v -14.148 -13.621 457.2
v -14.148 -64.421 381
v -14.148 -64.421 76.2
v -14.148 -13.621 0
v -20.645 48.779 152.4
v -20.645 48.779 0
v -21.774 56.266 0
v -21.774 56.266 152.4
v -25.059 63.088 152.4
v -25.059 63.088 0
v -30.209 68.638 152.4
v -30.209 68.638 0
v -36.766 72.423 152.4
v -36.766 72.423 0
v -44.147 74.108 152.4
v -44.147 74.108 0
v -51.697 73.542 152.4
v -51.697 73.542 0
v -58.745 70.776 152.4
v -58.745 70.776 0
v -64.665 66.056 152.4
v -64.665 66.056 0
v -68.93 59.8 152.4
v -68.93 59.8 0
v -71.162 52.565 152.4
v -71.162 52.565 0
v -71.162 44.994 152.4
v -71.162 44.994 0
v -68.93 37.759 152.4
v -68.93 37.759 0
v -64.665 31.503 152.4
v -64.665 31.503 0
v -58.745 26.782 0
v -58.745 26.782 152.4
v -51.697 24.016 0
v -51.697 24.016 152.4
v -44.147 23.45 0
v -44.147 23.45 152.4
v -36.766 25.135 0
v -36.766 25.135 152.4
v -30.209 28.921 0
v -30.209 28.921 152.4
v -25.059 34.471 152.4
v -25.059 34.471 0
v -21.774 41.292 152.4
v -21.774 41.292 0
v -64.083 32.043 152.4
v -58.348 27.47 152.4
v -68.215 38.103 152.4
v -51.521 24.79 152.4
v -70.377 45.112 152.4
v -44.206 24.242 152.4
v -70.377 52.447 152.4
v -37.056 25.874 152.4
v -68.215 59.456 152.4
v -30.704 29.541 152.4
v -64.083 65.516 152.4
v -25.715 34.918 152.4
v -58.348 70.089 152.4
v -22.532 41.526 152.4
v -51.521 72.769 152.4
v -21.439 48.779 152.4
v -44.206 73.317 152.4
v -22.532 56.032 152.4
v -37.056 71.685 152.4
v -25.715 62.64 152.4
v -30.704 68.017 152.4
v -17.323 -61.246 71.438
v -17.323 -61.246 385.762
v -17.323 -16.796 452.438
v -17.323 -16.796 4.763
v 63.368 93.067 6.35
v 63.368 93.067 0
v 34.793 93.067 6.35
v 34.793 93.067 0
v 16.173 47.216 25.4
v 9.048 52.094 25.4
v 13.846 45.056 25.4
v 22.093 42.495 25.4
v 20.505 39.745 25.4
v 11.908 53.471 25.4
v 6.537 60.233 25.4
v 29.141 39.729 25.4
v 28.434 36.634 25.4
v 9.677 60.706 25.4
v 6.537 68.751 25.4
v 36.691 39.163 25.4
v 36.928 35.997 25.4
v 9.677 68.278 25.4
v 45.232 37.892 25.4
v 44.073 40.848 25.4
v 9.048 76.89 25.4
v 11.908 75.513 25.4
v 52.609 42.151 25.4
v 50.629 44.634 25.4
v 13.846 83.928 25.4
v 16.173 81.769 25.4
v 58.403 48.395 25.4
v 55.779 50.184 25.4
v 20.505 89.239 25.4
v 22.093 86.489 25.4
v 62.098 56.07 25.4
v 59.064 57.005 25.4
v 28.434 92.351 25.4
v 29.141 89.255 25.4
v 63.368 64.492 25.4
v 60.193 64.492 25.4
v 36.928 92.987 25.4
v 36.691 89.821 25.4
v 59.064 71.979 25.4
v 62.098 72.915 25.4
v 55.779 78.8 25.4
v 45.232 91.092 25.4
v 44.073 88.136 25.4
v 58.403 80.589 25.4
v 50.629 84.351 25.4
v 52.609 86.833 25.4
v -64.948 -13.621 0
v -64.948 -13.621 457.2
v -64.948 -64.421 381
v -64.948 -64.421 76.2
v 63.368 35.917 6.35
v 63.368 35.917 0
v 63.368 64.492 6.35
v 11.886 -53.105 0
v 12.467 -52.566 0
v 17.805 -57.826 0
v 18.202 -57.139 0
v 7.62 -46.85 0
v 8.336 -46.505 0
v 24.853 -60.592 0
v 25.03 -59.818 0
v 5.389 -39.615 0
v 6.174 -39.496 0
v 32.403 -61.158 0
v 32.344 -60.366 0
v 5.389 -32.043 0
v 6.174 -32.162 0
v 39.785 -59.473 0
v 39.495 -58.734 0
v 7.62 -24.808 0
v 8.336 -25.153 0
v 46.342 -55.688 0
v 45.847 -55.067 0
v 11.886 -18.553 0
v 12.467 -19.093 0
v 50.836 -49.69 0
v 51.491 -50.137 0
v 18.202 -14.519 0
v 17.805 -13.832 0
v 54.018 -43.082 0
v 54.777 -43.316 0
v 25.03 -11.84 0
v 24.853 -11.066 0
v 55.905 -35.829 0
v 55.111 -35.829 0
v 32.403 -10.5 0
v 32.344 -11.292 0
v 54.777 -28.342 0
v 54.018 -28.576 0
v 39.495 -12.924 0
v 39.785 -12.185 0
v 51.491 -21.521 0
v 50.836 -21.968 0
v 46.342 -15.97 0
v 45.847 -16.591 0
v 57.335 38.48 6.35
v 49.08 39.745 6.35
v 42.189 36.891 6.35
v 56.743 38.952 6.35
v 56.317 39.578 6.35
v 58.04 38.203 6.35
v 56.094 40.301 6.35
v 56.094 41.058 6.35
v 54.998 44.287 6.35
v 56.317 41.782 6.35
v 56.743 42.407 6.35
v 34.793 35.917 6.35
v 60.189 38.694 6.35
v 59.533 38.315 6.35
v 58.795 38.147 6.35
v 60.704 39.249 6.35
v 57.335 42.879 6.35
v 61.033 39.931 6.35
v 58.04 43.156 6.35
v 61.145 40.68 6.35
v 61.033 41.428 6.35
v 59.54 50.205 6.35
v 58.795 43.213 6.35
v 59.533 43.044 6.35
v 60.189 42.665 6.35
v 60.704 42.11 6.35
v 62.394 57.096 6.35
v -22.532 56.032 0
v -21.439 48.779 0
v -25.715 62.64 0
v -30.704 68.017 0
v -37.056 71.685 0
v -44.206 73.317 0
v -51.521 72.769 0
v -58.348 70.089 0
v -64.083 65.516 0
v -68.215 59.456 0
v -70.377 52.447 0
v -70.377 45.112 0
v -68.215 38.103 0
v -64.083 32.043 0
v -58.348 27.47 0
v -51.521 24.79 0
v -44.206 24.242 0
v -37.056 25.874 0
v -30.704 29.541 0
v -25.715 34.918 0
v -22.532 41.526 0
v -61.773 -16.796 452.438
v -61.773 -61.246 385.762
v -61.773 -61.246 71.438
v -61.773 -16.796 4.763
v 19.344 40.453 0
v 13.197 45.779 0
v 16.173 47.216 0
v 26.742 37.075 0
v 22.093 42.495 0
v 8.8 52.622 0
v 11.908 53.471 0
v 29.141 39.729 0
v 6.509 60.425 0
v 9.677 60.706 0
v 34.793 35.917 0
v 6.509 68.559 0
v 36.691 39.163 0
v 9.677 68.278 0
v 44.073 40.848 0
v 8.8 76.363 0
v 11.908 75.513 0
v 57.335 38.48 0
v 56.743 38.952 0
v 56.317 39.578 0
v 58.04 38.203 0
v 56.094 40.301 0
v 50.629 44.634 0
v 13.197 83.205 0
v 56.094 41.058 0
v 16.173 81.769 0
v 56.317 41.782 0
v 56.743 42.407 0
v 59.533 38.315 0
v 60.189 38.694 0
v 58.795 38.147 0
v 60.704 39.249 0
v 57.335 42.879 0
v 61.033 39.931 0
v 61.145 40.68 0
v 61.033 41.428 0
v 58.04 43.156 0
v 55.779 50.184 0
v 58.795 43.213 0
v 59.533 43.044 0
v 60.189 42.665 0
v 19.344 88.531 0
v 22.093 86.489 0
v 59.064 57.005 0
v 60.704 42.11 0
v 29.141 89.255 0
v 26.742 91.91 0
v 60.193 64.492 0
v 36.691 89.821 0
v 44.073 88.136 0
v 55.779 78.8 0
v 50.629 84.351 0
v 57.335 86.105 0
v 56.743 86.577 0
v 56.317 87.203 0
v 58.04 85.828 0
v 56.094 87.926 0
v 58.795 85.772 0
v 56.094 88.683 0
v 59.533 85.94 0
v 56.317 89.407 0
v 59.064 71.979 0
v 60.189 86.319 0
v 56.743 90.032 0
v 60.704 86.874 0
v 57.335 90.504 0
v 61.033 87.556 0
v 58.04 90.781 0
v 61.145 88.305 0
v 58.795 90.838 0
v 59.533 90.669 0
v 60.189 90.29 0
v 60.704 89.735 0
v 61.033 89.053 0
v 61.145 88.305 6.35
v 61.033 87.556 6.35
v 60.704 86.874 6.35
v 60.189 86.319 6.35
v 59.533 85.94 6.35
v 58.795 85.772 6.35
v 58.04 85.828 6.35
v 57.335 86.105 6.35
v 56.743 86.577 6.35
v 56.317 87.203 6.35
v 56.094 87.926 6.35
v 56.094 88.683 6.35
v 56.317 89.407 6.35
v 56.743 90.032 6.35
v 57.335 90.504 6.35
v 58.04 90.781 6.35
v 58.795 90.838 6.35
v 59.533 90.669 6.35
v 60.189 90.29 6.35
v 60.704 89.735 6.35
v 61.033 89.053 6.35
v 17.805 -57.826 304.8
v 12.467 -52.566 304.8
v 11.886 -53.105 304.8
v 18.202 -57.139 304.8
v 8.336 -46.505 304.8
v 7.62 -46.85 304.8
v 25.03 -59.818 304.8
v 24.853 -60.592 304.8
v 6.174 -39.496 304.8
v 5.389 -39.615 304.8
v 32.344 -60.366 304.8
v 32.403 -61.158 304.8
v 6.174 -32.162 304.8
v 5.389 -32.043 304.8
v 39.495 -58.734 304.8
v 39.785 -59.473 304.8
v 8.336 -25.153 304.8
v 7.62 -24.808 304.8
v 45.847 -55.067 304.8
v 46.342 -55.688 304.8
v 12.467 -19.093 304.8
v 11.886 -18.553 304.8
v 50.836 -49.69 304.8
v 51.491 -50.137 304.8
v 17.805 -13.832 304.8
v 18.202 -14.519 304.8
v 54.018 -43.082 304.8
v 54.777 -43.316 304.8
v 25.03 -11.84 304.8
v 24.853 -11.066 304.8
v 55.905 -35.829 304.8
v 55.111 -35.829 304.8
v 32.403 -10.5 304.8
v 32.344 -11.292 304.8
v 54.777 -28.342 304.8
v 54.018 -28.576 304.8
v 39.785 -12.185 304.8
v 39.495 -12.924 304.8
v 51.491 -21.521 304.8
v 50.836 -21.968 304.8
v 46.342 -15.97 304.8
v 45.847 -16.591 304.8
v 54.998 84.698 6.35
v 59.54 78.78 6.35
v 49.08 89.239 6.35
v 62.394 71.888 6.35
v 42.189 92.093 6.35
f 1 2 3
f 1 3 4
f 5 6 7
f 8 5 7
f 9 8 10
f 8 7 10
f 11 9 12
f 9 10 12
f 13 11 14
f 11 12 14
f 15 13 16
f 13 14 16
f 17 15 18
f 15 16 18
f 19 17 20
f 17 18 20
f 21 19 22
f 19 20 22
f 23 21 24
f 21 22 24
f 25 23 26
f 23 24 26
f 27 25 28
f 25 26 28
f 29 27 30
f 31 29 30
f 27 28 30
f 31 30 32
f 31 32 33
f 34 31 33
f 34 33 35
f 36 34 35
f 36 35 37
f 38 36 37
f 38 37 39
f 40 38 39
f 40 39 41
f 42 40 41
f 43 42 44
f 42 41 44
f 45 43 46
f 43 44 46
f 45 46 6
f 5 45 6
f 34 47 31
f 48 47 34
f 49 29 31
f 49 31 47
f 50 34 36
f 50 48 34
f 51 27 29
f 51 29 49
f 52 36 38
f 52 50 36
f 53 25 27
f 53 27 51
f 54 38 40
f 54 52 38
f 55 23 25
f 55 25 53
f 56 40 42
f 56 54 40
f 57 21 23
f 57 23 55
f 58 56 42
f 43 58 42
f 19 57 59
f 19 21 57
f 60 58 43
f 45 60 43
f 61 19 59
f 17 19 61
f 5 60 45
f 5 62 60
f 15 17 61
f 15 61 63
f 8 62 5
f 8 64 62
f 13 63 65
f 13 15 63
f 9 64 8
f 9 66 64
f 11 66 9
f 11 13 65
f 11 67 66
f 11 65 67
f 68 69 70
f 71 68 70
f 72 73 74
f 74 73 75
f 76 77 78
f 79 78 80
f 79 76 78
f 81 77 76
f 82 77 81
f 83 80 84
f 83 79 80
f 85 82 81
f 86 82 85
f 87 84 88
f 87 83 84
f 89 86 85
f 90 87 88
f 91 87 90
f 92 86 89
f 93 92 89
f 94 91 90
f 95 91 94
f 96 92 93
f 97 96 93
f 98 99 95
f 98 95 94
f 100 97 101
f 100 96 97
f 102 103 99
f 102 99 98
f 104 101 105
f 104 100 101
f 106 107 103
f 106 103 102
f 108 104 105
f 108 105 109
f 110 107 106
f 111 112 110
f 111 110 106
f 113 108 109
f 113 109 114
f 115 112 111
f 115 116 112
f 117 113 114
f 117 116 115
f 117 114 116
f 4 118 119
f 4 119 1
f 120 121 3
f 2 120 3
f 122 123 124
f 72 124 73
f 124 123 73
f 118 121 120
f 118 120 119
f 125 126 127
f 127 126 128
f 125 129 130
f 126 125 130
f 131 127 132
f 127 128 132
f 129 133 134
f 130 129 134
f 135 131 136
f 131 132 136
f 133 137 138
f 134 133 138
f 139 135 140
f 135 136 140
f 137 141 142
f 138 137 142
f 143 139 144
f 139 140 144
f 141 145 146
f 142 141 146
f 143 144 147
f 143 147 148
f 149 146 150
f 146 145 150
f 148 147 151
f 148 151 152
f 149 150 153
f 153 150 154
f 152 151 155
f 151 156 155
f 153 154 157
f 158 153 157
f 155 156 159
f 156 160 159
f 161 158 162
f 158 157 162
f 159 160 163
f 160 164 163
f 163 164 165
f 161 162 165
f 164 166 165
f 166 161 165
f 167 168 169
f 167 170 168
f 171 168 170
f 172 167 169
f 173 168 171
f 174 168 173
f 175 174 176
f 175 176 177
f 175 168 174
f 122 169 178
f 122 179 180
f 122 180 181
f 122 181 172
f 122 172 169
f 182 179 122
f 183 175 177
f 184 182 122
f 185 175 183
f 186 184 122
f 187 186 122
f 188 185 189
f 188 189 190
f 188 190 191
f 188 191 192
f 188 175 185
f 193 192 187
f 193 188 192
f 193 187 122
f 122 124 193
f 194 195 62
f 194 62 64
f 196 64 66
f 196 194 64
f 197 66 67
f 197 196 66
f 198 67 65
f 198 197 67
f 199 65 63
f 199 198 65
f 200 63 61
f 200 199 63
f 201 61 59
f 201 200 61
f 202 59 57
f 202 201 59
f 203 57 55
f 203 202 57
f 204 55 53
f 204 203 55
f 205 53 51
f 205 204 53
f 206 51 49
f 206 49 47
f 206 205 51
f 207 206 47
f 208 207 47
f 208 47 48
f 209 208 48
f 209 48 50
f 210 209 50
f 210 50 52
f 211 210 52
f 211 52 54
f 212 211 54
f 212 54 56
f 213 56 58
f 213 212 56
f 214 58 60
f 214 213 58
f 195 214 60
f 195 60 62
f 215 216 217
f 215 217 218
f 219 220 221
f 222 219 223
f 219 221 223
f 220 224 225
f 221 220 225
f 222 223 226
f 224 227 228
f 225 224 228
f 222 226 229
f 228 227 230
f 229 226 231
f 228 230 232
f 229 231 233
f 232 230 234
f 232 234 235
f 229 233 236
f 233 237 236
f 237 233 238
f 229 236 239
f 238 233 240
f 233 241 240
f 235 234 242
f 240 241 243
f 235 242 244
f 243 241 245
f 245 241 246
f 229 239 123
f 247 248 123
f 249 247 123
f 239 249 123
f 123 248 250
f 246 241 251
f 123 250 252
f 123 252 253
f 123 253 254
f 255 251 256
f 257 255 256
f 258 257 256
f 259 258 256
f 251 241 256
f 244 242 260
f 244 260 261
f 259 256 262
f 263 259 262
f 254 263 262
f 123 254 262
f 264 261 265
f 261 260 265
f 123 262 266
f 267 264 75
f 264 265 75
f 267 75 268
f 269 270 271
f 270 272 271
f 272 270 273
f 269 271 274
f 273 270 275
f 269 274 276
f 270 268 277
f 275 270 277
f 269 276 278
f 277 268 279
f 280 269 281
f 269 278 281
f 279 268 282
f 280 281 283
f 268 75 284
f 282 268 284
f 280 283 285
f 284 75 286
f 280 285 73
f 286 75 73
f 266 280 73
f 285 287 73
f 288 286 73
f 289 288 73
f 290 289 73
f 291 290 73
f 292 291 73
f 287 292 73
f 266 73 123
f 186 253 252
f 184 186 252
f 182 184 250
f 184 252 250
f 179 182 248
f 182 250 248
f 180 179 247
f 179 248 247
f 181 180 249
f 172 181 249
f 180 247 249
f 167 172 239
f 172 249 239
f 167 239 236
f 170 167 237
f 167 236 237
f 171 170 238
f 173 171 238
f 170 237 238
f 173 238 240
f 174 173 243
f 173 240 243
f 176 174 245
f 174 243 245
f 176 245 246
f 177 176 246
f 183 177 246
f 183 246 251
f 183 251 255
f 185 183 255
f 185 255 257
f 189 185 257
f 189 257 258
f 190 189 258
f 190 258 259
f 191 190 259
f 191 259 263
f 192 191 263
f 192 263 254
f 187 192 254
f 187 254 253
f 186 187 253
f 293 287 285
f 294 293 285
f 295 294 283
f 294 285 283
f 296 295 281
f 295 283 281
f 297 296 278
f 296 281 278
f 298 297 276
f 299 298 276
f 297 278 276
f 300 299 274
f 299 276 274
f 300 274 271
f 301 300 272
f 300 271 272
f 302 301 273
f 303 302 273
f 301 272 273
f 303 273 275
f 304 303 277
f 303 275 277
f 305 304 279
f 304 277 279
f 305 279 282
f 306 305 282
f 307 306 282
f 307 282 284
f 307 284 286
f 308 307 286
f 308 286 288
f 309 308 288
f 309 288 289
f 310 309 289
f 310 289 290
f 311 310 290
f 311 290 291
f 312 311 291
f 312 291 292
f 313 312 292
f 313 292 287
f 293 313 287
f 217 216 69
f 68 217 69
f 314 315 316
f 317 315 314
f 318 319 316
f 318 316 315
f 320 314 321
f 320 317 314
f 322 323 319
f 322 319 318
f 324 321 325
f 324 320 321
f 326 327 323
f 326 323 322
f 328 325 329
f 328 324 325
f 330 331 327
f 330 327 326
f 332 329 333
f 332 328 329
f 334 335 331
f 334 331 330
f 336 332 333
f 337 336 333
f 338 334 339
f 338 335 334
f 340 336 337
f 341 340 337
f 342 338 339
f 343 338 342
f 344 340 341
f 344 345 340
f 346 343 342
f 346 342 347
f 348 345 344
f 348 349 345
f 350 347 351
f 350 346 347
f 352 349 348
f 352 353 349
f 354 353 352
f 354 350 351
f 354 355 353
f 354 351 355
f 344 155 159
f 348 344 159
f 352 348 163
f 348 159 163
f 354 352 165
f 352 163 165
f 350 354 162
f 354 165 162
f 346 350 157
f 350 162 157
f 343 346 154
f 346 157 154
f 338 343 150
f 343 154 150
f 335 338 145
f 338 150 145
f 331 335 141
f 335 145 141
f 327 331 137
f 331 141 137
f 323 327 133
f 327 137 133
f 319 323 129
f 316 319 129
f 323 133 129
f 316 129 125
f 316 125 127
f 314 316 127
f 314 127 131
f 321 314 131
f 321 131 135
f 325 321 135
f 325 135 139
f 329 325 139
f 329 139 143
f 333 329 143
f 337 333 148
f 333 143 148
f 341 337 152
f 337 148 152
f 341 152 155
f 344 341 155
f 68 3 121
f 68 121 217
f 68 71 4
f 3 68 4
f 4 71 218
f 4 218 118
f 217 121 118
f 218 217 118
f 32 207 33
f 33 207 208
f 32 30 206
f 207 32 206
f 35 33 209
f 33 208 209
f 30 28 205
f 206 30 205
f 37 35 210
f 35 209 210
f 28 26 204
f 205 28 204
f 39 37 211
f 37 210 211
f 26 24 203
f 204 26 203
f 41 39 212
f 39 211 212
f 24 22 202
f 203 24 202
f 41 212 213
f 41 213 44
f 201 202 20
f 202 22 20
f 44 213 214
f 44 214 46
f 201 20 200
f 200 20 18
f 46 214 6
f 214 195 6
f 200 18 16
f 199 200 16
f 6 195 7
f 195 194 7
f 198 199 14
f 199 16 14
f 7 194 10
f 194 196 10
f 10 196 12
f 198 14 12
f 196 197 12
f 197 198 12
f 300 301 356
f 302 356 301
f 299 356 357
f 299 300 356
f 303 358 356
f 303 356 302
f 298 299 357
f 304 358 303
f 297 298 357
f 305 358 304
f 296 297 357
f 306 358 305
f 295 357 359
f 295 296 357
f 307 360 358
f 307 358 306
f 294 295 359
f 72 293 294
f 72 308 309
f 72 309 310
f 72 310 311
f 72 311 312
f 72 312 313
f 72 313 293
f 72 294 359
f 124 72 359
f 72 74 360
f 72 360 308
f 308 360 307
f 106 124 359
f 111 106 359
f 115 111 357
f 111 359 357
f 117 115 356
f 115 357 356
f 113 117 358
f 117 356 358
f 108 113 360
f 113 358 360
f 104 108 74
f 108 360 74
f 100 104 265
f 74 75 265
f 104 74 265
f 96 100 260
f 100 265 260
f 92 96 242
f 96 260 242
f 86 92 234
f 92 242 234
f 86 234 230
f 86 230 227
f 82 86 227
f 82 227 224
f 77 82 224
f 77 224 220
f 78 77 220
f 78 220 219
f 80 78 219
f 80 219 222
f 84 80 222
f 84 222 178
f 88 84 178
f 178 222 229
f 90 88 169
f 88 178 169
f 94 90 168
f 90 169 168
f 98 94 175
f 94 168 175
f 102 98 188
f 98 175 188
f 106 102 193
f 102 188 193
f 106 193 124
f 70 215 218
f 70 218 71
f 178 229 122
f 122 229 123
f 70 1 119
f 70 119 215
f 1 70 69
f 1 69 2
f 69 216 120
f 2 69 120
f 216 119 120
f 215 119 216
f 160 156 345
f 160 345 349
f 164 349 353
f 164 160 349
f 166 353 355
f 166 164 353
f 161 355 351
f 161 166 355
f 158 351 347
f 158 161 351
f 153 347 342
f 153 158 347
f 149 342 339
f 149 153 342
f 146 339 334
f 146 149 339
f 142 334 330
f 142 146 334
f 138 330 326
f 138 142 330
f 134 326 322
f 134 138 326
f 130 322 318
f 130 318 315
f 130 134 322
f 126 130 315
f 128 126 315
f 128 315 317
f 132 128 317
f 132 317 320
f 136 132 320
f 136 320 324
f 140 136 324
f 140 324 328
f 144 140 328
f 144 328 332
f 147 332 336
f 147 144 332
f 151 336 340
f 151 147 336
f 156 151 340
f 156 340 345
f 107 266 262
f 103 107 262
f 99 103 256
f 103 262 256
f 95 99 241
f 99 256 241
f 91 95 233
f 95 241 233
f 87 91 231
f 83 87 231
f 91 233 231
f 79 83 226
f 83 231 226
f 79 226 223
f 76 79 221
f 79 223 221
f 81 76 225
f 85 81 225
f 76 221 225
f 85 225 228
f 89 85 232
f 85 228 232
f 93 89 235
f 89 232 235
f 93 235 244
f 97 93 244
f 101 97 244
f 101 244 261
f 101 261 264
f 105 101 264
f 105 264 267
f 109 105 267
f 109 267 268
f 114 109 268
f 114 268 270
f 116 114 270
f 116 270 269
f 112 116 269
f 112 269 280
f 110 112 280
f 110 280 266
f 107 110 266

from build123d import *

# Parameters (mm, degrees)
F0_R       = 25.4
F0_R_2     = 24.60625
F1_DEPTH   = 152.4
F2_R       = 25.4
F2_R_2     = 24.60625
F3_DEPTH   = 304.8
F5_DEPTH   = 6.35
F7_DEPTH   = 19.05
F8_R       = 25.4
F8_R_2     = 2.54
F9_DEPTH   = 304.801
F10_R      = 26.9875
F11_DEPTH  = 6.35
F12_R      = 24.60625
F13_DEPTH  = 19.05
F14_R      = 2.159
F14_R_2    = 12.7
F13_FACE_R = 24.60625
F15_DEPTH  = 304.801
F16_R      = 2.159
F17_DEPTH  = 19.05
F18_R      = 12.7
F19_DEPTH  = 19.05
F20_R      = 25.4
F20_R_2    = 2.159
F20_R_3    = 12.7
F21_DEPTH  = 3.175
F23_W      = 50.8
F23_H      = 50.8
F23_W_2    = 44.45
F23_H_2    = 44.45
F24_DEPTH  = 457.2
F26_DEPTH  = 128.3173194947


with BuildPart() as f1:
    # F0 (on Top) → F1 (new body)
    with BuildSketch(Plane.XY):
        with Locations((-46.0453219712, 48.7792603672)):
            Circle(F0_R)
        with Locations((-46.0453219712, 48.7792603672)):
            Circle(F0_R_2, mode=Mode.SUBTRACT)
    extrude(amount=F1_DEPTH)


with BuildPart() as f3:
    # F2 (on Top) → F3 (new body)
    with BuildSketch(Plane.XY):
        with Locations((30.5050238967, -35.8290150762)):
            Circle(F2_R)
        with Locations((30.5050238967, -35.8290150762)):
            Circle(F2_R_2, mode=Mode.SUBTRACT)
    extrude(amount=F3_DEPTH)


with BuildPart() as f5:
    # F4 (on Top) → F5 (new body)
    with BuildSketch(Plane.XY):
        with BuildLine():
            Line((63.3678516858, 35.9171391623), (63.3678516858, 64.4921391623))
            ThreePointArc((63.3678516858, 64.4921391623), (54.9984279582, 44.2865628899), (34.7928516858, 35.9171391623))
            Line((34.7928516858, 35.9171391623), (63.3678516858, 35.9171391623))
        make_face()
        with BuildLine():
            ThreePointArc((34.7928516858, 35.9171391623), (54.9984279582, 44.2865628899), (63.3678516858, 64.4921391623))
            ThreePointArc((63.3678516858, 64.4921391623), (54.9984279582, 84.6977154347), (34.7928516858, 93.0671391623))
            Line((34.7928516858, 93.0671391623), (34.7928516858, 35.9171391623))
        make_face()
        with BuildLine():
            ThreePointArc((34.7928516858, 93.0671391623), (54.9984279582, 84.6977154347), (63.3678516858, 64.4921391623))
            Line((63.3678516858, 64.4921391623), (63.3678516858, 93.0671391623))
            Line((63.3678516858, 93.0671391623), (34.7928516858, 93.0671391623))
        make_face()
        with BuildLine():
            Line((34.7928516858, 35.9171391623), (34.7928516858, 93.0671391623))
            ThreePointArc((34.7928516858, 93.0671391623), (6.2178516858, 64.4921391623), (34.7928516858, 35.9171391623))
        make_face()
    extrude(amount=F5_DEPTH)

    # F6 (on face) → F7 (join)
    with BuildSketch(Plane.XY.offset(6.35)):
        with BuildLine():
            ThreePointArc((34.7928516858, 35.9171391623), (54.9984279582, 44.2865628899), (63.3678516858, 64.4921391623))
            ThreePointArc((63.3678516858, 64.4921391623), (54.9984279582, 84.6977154347), (34.7928516858, 93.0671391623))
            ThreePointArc((34.7928516858, 93.0671391623), (6.2178516858, 64.4921391623), (34.7928516858, 35.9171391623))
        make_face()
    extrude(amount=F7_DEPTH)

    # F8 (on face) → F9 (cut, through all)
    with BuildSketch(Plane(origin=(0, 0, 0), x_dir=(1, 0, 0), z_dir=(0, 0, -1))):
        with Locations((34.7928516858, -64.4921391623)):
            Circle(F8_R)
        with Locations((58.6053516858, -88.3046391623)):
            Circle(F8_R_2)
        with Locations((58.6053516858, -40.6796391623)):
            Circle(F8_R_2)
    extrude(amount=-F9_DEPTH, mode=Mode.SUBTRACT)


with BuildPart() as f11:
    # F10 (on Top) → F11 (new body)
    with BuildSketch(Plane.XY):
        with Locations((-46.9862222672, -21.7718593776)):
            Circle(F10_R)
    extrude(amount=F11_DEPTH)

    # F12 (on face) → F13 (join)
    with BuildSketch(Plane.XY.offset(6.35)):
        with Locations((-46.9862222672, -21.7718593776)):
            Circle(F12_R)
    extrude(amount=F13_DEPTH)

    # F14 (on face) + F13_face (on face) → F15 (cut, through all)
    with BuildSketch(Plane(origin=(0, 0, 0), x_dir=(1, 0, 0), z_dir=(0, 0, -1))):
        with Locations((-46.9862222672, 43.3618593776)):
            Circle(F14_R)
        with Locations((-25.3962222672, 21.7718593776)):
            Circle(F14_R)
        with Locations((-46.9862222672, 0.1818593776)):
            Circle(F14_R)
        with Locations((-68.5762222672, 21.7718593776)):
            Circle(F14_R)
        with Locations((-46.9862222672, 21.7718593776)):
            Circle(F14_R_2)
    with BuildSketch(Plane(origin=(-46.9862222672, -21.7718593776, 25.4), x_dir=(1, 0, 0), z_dir=(0, 0, 1))):
        Circle(F13_FACE_R)
    extrude(amount=-F15_DEPTH, dir=(0, 0, -1), mode=Mode.SUBTRACT)

    # F16 (on face) → F17 (cut)
    with BuildSketch(Plane.XY.offset(25.4)):
        with BuildLine():
            Line((-52.4140715319, 2.2282654433), (-51.6314077164, -1.2324108482))
            ThreePointArc((-51.6314077164, -1.2324108482), (-46.9862222672, -4.9443593776), (-42.3410368179, -1.2324108482))
            Line((-42.3410368179, -1.2324108482), (-41.5583730024, 2.2282654433))
            ThreePointArc((-41.5583730024, 2.2282654433), (-46.9862222672, 2.8343906224), (-52.4140715319, 2.2282654433))
        make_face()
        with Locations((-46.9862222672, -0.1818593776)):
            Circle(F16_R, mode=Mode.SUBTRACT)
        with BuildLine():
            ThreePointArc((-22.3799722672, -21.7718593776), (-22.5319730409, -19.0410657488), (-22.9860974462, -16.3440101129))
            Line((-22.9860974462, -16.3440101129), (-26.4467737377, -17.1266739284))
            ThreePointArc((-26.4467737377, -17.1266739284), (-30.1587222672, -21.7718593776), (-26.4467737377, -26.4170448268))
            Line((-26.4467737377, -26.4170448268), (-22.9860974462, -27.1997086423))
            ThreePointArc((-22.9860974462, -27.1997086423), (-22.5319730409, -24.5026530065), (-22.3799722672, -21.7718593776))
        make_face()
        with Locations((-25.3962222672, -21.7718593776)):
            Circle(F16_R, mode=Mode.SUBTRACT)
        with BuildLine():
            Line((-51.6314077164, -42.311307907), (-52.4140715319, -45.7719841986))
            ThreePointArc((-52.4140715319, -45.7719841986), (-46.9862222672, -46.3781093776), (-41.5583730024, -45.7719841986))
            Line((-41.5583730024, -45.7719841986), (-42.3410368179, -42.311307907))
            ThreePointArc((-42.3410368179, -42.311307907), (-46.9862222672, -38.5993593776), (-51.6314077164, -42.311307907))
        make_face()
        with Locations((-46.9862222672, -43.3618593776)):
            Circle(F16_R, mode=Mode.SUBTRACT)
        with BuildLine():
            Line((-67.5256707966, -17.1266739284), (-70.9863470881, -16.3440101129))
            ThreePointArc((-70.9863470881, -16.3440101129), (-71.5924722672, -21.7718593776), (-70.9863470881, -27.1997086423))
            Line((-70.9863470881, -27.1997086423), (-67.5256707966, -26.4170448268))
            ThreePointArc((-67.5256707966, -26.4170448268), (-63.8137222672, -21.7718593776), (-67.5256707966, -17.1266739284))
        make_face()
        with Locations((-68.5762222672, -21.7718593776)):
            Circle(F16_R, mode=Mode.SUBTRACT)
    extrude(amount=-F17_DEPTH, mode=Mode.SUBTRACT)

    # F18 (on face) → F19 (cut)
    with BuildSketch(Plane.XY.offset(25.4)):
        with BuildLine():
            ThreePointArc((-39.7226986142, -0.9353382379), (-46.9862222672, -7.4843593776), (-54.2497459201, -0.9353382379))
            ThreePointArc((-54.2497459201, -0.9353382379), (-62.5894172775, -6.1686643673), (-67.8227434069, -14.5083357247))
            ThreePointArc((-67.8227434069, -14.5083357247), (-61.2737222672, -21.7718593776), (-67.8227434069, -29.0353830306))
            ThreePointArc((-67.8227434069, -29.0353830306), (-62.5894172775, -37.375054388), (-54.2497459201, -42.6083805173))
            ThreePointArc((-54.2497459201, -42.6083805173), (-46.9862222672, -36.0593593776), (-39.7226986142, -42.6083805173))
            ThreePointArc((-39.7226986142, -42.6083805173), (-31.3830272568, -37.375054388), (-26.1497011274, -29.0353830306))
            ThreePointArc((-26.1497011274, -29.0353830306), (-32.6987222672, -21.7718593776), (-26.1497011274, -14.5083357247))
            ThreePointArc((-26.1497011274, -14.5083357247), (-31.3830272568, -6.1686643673), (-39.7226986142, -0.9353382379))
        make_face()
        with Locations((-46.9862222672, -21.7718593776)):
            Circle(F18_R, mode=Mode.SUBTRACT)
    extrude(amount=-F19_DEPTH, mode=Mode.SUBTRACT)

    # F20 (on face) → F21 (cut)
    with BuildSketch(Plane(origin=(0, 0, 0), x_dir=(1, 0, 0), z_dir=(0, 0, -1))):
        with Locations((-46.9862222672, 21.7718593776)):
            Circle(F20_R)
        with Locations((-46.9862222672, 0.1818593776)):
            Circle(F20_R_2, mode=Mode.SUBTRACT)
        with Locations((-68.5762222672, 21.7718593776)):
            Circle(F20_R_2, mode=Mode.SUBTRACT)
        with Locations((-46.9862222672, 43.3618593776)):
            Circle(F20_R_2, mode=Mode.SUBTRACT)
        with Locations((-46.9862222672, 21.7718593776)):
            Circle(F20_R_3, mode=Mode.SUBTRACT)
        with Locations((-25.3962222672, 21.7718593776)):
            Circle(F20_R_2, mode=Mode.SUBTRACT)
    extrude(amount=-F21_DEPTH, mode=Mode.SUBTRACT)


with BuildPart() as f24:
    # F23 (on Top) → F24 (new body)
    with BuildSketch(Plane.XY):
        with Locations((-39.548467809, -39.0210635602)):
            Rectangle(F23_W, F23_H)
        with Locations((-39.548467809, -39.0210635602)):
            Rectangle(F23_W_2, F23_H_2, mode=Mode.SUBTRACT)
    extrude(amount=F24_DEPTH)

    # F25 (on face) → F26 (cut, through all)
    with BuildSketch(Plane(origin=(-64.948467809, 0, 0), x_dir=(0, -1, 0), z_dir=(-1, 0, 0))):
        Polygon((64.4210635602, 381), (64.4210635602, 457.2), (13.6210635602, 457.2), align=None)
        Polygon((64.4210635602, 0), (64.4210635602, 76.2), (13.6210635602, 0), align=None)
    extrude(amount=-F26_DEPTH, mode=Mode.SUBTRACT)


solid = Compound([f1.part, f3.part, f5.part, f24.part])
